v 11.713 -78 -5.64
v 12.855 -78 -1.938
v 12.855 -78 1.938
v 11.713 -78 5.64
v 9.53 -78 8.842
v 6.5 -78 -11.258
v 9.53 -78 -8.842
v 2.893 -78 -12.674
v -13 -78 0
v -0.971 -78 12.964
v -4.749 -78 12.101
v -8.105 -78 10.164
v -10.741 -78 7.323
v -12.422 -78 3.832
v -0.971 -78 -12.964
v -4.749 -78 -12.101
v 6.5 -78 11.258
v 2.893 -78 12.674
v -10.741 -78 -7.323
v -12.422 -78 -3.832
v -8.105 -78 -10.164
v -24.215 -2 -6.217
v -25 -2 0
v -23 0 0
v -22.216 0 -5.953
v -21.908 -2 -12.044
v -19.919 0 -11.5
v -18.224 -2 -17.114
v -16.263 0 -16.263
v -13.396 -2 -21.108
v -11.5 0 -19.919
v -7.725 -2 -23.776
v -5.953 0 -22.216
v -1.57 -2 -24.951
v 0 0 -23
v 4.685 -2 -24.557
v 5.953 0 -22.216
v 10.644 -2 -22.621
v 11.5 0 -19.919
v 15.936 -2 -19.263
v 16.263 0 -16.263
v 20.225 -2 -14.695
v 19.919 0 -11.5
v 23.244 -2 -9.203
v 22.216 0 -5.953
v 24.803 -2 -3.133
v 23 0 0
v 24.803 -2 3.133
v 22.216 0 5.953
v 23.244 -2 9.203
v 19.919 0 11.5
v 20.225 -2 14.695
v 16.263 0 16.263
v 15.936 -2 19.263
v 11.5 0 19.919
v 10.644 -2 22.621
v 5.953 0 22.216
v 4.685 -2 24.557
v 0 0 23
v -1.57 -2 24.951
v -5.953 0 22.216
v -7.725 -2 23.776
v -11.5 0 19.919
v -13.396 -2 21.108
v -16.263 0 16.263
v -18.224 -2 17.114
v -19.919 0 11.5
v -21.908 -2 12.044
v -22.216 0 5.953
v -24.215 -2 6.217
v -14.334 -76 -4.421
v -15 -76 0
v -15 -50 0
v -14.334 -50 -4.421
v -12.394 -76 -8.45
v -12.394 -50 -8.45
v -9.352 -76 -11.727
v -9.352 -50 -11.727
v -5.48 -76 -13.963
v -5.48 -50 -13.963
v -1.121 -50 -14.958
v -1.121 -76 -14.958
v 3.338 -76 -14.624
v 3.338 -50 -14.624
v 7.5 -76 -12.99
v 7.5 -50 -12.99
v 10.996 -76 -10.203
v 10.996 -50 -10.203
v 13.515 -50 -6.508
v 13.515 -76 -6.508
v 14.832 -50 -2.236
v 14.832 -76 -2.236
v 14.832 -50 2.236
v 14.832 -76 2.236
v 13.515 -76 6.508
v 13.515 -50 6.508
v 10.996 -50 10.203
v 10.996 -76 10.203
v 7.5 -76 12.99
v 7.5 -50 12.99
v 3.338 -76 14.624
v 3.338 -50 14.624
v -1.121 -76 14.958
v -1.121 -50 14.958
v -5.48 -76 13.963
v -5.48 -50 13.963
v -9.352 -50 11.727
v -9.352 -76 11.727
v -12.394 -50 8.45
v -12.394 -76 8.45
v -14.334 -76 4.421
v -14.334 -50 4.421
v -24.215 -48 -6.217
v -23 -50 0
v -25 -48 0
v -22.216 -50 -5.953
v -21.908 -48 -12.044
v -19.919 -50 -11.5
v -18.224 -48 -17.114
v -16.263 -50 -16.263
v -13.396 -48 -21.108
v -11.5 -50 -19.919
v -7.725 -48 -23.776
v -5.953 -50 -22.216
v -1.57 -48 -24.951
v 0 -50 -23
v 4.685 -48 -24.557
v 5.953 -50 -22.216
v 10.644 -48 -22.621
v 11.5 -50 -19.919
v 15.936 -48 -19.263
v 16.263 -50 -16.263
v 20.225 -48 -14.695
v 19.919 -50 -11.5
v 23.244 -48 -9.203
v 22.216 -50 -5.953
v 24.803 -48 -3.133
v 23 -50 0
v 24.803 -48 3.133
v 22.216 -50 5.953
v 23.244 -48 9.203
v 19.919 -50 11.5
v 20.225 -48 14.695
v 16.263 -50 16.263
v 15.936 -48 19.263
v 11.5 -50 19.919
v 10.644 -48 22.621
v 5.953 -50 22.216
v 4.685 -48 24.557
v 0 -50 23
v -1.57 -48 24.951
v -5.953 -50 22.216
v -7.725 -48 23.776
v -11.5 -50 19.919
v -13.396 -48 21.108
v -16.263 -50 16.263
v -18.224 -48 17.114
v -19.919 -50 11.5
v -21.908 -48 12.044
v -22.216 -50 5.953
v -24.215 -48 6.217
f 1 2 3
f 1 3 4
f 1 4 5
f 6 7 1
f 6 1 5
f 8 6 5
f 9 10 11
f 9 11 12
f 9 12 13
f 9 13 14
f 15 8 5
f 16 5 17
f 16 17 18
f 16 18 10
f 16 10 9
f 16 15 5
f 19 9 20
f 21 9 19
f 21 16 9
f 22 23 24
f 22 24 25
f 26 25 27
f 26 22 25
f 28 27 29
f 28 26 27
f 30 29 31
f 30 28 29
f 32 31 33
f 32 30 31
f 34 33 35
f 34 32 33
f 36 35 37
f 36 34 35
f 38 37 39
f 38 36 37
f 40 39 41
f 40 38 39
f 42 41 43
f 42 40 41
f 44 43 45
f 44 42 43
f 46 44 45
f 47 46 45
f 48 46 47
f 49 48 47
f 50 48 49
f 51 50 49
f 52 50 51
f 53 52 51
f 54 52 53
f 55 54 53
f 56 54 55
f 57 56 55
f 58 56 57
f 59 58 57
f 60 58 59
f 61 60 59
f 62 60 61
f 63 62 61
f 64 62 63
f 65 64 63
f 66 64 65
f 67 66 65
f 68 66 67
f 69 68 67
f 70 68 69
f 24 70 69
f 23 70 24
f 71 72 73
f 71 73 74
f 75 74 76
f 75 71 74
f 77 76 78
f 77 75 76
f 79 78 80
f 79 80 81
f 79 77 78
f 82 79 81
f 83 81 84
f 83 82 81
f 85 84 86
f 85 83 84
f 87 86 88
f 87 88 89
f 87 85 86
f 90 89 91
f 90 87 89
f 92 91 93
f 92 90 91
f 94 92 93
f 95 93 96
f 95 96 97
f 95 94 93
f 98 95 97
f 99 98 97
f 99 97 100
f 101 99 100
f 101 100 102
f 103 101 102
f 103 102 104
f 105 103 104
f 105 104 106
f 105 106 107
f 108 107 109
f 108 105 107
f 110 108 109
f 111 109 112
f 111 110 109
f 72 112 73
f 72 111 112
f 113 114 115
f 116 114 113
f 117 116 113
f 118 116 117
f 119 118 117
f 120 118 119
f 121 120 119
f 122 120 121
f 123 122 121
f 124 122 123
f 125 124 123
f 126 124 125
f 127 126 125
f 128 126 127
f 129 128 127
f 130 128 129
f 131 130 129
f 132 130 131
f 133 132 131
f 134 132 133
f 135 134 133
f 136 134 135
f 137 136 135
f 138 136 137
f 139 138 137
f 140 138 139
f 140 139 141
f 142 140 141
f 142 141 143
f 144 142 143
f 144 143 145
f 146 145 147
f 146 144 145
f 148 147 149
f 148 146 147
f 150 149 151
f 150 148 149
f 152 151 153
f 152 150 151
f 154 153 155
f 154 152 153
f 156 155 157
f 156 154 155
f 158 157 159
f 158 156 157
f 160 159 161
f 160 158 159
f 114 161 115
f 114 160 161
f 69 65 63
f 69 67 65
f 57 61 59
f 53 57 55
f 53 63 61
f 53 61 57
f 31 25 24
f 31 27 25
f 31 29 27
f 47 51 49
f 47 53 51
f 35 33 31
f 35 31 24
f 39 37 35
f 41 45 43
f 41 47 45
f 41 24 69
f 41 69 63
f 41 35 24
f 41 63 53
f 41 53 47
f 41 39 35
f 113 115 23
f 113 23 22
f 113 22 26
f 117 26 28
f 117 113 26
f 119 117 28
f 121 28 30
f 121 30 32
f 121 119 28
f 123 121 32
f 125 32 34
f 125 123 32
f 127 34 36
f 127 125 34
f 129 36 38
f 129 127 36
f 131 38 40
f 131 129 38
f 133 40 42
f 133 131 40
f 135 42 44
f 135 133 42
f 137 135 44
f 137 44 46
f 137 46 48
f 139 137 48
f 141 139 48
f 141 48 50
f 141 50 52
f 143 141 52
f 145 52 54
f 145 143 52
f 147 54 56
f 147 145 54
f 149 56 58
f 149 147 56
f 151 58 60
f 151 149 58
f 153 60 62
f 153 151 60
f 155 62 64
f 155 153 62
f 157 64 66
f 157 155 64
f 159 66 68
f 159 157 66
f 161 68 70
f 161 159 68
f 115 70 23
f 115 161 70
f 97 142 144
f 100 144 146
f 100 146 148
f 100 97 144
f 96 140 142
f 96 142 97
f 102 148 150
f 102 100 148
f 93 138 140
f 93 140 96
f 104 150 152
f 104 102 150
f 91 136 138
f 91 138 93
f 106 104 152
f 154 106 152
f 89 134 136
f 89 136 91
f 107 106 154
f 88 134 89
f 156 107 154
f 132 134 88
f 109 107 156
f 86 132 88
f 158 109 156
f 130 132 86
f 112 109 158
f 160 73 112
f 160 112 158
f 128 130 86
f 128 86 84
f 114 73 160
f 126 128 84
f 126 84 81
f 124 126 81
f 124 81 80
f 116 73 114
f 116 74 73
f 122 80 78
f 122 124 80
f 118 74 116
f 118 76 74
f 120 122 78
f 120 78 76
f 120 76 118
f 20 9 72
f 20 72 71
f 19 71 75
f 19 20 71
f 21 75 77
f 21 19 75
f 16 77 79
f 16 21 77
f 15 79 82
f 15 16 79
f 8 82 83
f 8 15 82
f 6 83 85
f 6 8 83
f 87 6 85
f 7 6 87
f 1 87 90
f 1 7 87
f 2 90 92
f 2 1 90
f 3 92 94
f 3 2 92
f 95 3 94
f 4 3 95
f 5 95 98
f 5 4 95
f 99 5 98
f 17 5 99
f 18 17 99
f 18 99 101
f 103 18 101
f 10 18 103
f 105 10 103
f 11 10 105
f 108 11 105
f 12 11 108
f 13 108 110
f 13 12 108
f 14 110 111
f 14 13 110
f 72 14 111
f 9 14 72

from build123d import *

# Parameters (mm, degrees)
CHAMFER1_SIZE = 2


with BuildPart() as part:
    # Sketch1 → Revolve1 (revolve)
    with BuildSketch(Plane.XY, mode=Mode.PRIVATE) as revolve1_sk:
        Polygon((0, 0), (25, 0), (25, -50), (15, -50), (15, -78), (0, -78), align=None)
    revolve(revolve1_sk.sketch.rotate(Axis((0, 5, 0), (0, -1, 0)), 180), axis=Axis((0, 5, 0), (0, -1, 0)))

    # Chamfer1
    chamfer1_edges = [part.edges().sort_by_distance(p)[0] for p in [
        (15, -78, 0),
        (25, -50, 0),
        (25, 0, 0),
    ]]
    chamfer(chamfer1_edges, length=CHAMFER1_SIZE)


solid = part.part
